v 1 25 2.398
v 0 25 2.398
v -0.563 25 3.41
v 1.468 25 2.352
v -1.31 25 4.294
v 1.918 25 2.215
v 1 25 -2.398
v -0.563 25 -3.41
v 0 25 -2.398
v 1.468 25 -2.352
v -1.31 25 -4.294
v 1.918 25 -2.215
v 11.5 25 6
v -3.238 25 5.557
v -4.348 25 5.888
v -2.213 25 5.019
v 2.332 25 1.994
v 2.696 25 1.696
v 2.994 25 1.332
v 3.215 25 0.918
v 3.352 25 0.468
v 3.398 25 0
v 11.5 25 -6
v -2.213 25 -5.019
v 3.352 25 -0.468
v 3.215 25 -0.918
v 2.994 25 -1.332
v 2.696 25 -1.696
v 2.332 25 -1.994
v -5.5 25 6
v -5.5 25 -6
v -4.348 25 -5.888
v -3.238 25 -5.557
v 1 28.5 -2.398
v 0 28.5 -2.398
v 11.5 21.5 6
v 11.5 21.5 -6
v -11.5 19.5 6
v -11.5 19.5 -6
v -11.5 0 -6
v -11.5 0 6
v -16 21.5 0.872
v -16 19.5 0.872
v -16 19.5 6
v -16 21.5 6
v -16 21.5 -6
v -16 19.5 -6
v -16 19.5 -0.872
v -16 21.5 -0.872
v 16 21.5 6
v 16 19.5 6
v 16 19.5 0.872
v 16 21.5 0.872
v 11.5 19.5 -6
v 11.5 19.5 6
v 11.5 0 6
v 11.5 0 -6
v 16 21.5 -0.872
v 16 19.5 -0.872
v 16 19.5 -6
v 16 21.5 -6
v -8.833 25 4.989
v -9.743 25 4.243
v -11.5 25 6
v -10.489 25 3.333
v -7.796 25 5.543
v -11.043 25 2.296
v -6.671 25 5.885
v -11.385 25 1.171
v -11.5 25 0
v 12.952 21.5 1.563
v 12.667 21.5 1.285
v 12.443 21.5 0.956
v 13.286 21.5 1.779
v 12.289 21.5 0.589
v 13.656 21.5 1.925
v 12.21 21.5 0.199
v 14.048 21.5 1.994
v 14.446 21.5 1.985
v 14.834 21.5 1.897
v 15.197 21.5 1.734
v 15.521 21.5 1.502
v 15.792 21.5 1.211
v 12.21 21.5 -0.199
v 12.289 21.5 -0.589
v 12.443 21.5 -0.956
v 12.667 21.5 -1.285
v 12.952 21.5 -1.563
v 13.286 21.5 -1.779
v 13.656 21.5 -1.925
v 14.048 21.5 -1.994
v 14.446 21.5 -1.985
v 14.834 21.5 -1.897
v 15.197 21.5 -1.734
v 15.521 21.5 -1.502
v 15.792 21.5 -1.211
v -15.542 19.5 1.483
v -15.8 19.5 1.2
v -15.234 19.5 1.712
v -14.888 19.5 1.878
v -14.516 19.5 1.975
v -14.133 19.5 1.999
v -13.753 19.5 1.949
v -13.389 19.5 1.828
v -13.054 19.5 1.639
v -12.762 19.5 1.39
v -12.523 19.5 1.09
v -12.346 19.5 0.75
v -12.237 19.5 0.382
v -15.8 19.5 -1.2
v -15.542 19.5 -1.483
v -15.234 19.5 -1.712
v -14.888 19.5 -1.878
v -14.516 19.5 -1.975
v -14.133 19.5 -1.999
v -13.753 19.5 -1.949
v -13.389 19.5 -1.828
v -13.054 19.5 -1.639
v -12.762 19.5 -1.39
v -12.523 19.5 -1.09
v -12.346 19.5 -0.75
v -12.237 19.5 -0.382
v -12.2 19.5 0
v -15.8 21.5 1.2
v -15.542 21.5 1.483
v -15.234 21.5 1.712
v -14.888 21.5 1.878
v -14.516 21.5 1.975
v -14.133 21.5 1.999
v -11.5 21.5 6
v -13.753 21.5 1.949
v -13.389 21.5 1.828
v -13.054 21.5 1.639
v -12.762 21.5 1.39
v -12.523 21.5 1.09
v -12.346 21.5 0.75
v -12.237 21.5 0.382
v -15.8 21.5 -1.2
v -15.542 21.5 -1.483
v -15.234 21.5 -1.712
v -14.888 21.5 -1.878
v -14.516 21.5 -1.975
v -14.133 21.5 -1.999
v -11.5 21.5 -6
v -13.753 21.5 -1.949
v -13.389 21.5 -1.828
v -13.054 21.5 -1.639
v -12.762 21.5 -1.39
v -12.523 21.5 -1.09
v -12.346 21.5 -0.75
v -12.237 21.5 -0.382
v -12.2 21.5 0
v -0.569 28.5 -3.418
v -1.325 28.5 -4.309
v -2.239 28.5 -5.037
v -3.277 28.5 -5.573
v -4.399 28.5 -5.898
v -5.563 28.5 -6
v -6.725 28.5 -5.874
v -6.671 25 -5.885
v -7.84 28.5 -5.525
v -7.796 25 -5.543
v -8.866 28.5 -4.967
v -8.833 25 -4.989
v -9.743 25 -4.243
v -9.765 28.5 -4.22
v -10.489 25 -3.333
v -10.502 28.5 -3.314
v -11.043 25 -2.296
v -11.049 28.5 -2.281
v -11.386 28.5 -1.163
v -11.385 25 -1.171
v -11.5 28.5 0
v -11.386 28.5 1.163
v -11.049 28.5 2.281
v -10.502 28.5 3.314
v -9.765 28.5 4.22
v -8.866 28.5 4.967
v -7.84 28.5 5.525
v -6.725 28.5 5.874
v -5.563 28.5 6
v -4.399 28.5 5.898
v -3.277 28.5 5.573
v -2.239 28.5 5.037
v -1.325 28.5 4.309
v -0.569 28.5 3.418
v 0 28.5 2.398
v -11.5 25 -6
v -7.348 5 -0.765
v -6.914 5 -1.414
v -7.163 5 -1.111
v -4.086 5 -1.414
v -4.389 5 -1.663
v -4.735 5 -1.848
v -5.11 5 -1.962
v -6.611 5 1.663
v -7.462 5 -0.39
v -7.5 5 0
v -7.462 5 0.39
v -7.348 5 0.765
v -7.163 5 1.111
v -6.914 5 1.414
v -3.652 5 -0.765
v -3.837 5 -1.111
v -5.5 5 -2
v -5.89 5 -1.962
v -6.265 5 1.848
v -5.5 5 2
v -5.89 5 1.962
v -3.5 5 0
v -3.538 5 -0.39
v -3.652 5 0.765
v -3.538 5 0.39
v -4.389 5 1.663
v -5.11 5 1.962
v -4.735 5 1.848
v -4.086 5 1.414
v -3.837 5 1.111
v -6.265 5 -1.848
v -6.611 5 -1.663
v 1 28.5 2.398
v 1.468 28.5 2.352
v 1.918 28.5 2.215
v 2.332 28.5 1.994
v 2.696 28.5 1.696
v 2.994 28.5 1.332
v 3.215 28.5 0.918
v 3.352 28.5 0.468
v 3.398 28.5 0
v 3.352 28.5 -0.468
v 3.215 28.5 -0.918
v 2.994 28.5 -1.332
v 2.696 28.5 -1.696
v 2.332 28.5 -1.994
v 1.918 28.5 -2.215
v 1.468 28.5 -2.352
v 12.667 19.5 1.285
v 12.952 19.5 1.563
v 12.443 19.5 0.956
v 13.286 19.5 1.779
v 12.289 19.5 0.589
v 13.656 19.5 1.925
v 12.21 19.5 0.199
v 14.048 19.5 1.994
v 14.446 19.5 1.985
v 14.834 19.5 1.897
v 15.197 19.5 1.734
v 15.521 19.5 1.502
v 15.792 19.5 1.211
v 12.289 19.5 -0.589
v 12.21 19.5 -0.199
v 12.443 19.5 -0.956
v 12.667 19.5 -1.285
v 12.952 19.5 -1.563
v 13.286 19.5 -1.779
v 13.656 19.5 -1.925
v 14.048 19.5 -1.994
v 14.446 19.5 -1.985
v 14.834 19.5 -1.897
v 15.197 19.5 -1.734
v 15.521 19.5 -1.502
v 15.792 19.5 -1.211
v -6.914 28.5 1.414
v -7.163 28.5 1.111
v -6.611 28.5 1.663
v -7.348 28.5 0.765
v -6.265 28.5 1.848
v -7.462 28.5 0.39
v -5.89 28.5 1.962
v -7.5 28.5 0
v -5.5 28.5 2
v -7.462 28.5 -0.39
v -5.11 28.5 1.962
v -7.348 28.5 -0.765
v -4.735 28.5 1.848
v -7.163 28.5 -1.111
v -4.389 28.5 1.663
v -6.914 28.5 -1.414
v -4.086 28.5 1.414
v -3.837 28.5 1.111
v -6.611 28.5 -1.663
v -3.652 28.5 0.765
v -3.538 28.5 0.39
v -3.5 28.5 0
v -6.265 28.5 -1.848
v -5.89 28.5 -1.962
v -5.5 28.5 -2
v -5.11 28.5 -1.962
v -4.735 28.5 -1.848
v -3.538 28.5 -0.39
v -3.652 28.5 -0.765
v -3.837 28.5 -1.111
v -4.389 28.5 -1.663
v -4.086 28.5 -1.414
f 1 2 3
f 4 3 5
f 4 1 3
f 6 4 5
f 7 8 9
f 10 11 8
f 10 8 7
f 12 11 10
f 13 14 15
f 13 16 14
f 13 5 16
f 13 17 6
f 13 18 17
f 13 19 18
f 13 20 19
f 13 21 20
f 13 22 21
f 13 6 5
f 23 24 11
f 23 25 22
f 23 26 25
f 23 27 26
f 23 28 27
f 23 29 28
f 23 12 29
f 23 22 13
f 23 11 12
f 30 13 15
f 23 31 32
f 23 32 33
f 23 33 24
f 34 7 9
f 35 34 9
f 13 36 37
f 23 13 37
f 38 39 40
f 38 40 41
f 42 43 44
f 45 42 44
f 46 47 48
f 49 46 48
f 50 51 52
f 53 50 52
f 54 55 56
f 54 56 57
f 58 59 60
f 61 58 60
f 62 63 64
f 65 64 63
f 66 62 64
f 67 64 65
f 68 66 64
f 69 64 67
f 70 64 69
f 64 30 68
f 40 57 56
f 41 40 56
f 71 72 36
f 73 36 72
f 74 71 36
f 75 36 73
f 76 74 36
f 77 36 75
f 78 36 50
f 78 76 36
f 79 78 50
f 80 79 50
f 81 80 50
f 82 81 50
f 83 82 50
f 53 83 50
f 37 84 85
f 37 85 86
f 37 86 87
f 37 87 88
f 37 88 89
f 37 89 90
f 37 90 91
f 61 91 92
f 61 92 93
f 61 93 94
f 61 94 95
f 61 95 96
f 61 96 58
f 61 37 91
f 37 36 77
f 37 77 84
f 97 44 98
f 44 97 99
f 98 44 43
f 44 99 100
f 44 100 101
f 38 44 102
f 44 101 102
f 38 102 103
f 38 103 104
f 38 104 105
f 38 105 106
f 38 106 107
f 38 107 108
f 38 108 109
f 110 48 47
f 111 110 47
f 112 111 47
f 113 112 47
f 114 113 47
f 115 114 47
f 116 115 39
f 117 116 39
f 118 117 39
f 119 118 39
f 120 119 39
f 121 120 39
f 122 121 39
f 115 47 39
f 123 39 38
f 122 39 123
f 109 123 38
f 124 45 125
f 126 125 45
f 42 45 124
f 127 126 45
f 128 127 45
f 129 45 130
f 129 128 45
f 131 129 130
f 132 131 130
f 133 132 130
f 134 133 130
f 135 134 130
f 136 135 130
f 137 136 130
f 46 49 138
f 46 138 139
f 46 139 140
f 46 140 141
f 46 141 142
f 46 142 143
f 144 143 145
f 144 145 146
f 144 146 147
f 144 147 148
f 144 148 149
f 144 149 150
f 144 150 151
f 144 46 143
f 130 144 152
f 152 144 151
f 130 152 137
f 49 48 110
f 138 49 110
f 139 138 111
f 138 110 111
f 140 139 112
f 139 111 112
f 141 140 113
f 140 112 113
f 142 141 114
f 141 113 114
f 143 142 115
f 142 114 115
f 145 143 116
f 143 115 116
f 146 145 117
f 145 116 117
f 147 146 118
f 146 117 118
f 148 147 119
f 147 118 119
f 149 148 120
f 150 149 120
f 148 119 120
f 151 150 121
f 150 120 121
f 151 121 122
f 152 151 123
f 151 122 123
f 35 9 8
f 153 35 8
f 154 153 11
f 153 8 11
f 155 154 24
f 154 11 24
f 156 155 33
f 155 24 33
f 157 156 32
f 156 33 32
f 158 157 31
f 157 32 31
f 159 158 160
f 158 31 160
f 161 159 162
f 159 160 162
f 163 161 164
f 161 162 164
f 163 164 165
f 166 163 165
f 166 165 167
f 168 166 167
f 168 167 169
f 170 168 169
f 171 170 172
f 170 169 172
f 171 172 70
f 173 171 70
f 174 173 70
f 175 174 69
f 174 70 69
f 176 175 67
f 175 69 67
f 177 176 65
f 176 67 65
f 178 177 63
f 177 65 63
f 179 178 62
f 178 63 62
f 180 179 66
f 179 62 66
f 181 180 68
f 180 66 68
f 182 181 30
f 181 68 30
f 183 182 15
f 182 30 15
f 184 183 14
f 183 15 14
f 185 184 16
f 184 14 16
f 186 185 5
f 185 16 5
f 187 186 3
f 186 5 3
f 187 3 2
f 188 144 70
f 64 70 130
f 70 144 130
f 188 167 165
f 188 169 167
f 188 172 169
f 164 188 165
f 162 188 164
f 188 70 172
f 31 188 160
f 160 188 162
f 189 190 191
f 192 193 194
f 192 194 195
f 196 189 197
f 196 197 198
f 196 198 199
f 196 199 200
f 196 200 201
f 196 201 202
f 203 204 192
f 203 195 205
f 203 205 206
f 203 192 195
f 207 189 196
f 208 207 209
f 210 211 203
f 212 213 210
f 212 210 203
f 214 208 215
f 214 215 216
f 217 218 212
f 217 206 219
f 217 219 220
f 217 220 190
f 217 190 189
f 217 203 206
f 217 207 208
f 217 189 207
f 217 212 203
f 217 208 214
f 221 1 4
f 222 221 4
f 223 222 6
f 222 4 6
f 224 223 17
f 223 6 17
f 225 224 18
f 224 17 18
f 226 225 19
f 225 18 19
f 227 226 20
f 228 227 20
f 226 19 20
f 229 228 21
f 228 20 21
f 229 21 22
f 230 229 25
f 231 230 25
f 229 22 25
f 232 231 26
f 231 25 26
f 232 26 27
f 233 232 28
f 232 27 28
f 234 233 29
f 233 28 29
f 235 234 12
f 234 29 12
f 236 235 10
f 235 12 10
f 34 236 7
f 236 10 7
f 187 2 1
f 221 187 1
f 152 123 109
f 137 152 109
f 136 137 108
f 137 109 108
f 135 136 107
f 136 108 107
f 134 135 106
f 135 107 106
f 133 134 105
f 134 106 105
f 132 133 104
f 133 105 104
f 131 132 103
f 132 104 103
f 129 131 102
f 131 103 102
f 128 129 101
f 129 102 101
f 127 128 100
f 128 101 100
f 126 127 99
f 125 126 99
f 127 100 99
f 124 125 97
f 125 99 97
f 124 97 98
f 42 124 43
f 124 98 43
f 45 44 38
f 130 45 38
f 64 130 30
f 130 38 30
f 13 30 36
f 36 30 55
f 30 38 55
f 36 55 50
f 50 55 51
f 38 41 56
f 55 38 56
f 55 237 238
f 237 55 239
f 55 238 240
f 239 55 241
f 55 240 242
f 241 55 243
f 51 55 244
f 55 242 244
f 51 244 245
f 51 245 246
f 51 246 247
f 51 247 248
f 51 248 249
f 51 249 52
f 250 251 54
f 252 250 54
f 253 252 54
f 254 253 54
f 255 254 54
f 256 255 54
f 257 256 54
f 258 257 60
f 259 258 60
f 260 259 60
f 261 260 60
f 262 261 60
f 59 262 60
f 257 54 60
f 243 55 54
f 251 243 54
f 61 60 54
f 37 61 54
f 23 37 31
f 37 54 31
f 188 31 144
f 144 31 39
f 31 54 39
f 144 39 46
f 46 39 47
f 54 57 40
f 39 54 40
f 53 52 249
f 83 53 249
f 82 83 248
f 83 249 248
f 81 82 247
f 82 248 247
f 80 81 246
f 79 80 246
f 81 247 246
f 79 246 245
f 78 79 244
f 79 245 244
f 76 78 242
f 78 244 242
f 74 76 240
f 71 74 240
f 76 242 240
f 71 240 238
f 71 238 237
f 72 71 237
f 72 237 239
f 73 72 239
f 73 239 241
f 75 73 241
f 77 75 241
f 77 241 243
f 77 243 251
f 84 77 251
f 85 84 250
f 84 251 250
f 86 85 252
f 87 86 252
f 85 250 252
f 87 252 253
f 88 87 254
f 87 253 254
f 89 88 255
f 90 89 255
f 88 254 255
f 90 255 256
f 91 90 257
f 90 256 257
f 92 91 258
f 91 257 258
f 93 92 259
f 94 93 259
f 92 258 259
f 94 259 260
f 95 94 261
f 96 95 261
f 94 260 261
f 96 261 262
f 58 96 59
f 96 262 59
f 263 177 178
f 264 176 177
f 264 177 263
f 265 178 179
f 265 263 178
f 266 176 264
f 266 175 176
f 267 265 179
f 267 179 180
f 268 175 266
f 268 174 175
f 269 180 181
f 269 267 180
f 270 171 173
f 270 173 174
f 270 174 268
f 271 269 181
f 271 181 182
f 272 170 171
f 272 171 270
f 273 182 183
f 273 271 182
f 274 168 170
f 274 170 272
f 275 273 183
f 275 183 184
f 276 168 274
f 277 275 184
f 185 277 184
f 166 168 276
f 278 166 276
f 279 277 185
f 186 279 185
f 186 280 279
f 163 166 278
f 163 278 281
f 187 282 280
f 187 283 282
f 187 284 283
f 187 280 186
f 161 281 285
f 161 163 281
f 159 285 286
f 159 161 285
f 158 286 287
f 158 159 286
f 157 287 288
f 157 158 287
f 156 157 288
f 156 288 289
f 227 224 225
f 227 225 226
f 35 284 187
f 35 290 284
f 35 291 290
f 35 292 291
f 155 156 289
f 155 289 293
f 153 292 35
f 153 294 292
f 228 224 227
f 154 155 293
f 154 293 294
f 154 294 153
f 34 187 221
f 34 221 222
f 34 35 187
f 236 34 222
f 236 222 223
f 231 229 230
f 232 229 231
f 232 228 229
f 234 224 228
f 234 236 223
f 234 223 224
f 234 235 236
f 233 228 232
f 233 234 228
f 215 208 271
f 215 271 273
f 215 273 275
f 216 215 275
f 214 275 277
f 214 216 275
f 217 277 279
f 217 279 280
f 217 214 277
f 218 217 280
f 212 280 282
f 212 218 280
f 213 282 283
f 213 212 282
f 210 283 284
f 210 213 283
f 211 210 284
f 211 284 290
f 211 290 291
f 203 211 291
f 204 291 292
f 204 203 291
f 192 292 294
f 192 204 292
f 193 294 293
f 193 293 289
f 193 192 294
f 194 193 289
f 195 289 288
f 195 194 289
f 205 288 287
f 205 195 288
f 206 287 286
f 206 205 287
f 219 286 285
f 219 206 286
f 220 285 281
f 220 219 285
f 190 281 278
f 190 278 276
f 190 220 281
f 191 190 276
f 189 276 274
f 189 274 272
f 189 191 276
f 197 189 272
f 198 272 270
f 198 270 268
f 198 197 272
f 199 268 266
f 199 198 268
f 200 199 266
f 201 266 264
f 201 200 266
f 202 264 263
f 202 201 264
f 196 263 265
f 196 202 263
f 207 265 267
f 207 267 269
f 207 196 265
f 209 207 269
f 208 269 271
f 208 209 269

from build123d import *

# Parameters (mm, degrees)
SKETCH1_R           = 6
SKETCH1_R_2         = 2
BOSS_EXTRUDE1_DEPTH = 25
BOSS_EXTRUDE2_START = 19.5
BOSS_EXTRUDE2_DEPTH = 2
BOSS_EXTRUDE3_START = 25
SKETCH1_6_R         = 6
SKETCH1_6_R_2       = 2
BOSS_EXTRUDE3_DEPTH = 3.5
SKETCH1_7_R         = 2
BOSS_EXTRUDE4_DEPTH = 5


with BuildPart() as part:
    # Sketch1 → Boss-Extrude1 (new body)
    with BuildSketch(Plane(origin=(0, 0, 0), x_dir=(1, 0, 0), z_dir=(0, 1, 0))):
        with Locations((-5.5, 0)):
            Circle(SKETCH1_R)
        with Locations(Location((-5.5, 0, 0), (0, 0, 270))):
            Circle(SKETCH1_R_2, mode=Mode.SUBTRACT)
        with BuildLine():
            ThreePointArc((-5.499999996, 6), (-2.212713471, 5.019337334), (0, 2.397915762))
            Line((0, 2.397915762), (1, 2.397915762))
            ThreePointArc((1, 2.397915762), (3.397915762, 0), (1, -2.397915762))
            Line((1, -2.397915762), (0, -2.397915762))
            ThreePointArc((0, -2.397915762), (-2.212713472, -5.019337335), (-5.5, -6))
            Line((-5.5, -6), (11.5, -6))
            Line((11.5, -6), (11.5, 6))
            Line((11.5, 6), (-5.499999996, 6))
        make_face()
        with BuildLine():
            ThreePointArc((-5.5, -6), (-9.742640687, -4.242640687), (-11.5, 0))
            Line((-11.5, 0), (-11.5, -6))
            Line((-11.5, -6), (-5.5, -6))
        make_face()
        with BuildLine():
            Line((1, 2.397915762), (0, 2.397915762))
            ThreePointArc((0, 2.397915762), (0.373670062, 1.224744871), (0.5, 0))
            ThreePointArc((0.5, 0), (0.373670062, -1.224744871), (0, -2.397915762))
            Line((0, -2.397915762), (1, -2.397915762))
            ThreePointArc((1, -2.397915762), (3.397915762, 0), (1, 2.397915762))
        make_face()
        with BuildLine():
            ThreePointArc((-11.5, 0), (-9.742640686, 4.242640689), (-5.499999996, 6))
            Line((-5.499999996, 6), (-11.5, 6))
            Line((-11.5, 6), (-11.5, 0))
        make_face()
    extrude(amount=BOSS_EXTRUDE1_DEPTH)

    # Sketch1<4> → Boss-Extrude2 (add)
    with BuildSketch(Plane(origin=(0, 0, 0), x_dir=(1, 0, 0), z_dir=(0, 1, 0)).offset(BOSS_EXTRUDE2_START)):
        with BuildLine():
            Line((16, 6), (11.5, 6))
            Line((11.5, 6), (11.5, -6))
            Line((11.5, -6), (16, -6))
            Line((16, -6), (16, -0.871779789))
            ThreePointArc((16, -0.871779789), (12.2, 0), (16, 0.871779789))
            Line((16, 0.871779789), (16, 6))
        make_face()
        with BuildLine():
            Line((-11.5, 0), (-11.5, 6))
            Line((-11.5, 6), (-16, 6))
            Line((-16, 6), (-16, 0.871779789))
            ThreePointArc((-16, 0.871779789), (-13.752786405, 1.949358869), (-12.2, 0))
            ThreePointArc((-12.2, 0), (-13.752786405, -1.949358869), (-16, -0.871779789))
            Line((-16, -0.871779789), (-16, -6))
            Line((-16, -6), (-11.5, -6))
            Line((-11.5, -6), (-11.5, 0))
        make_face()
    extrude(amount=BOSS_EXTRUDE2_DEPTH)

    # Sketch1<6> → Boss-Extrude3 (add)
    with BuildSketch(Plane(origin=(0, 0, 0), x_dir=(1, 0, 0), z_dir=(0, 1, 0)).offset(BOSS_EXTRUDE3_START)):
        with Locations((-5.5, 0)):
            Circle(SKETCH1_6_R)
        with Locations(Location((-5.5, 0, 0), (0, 0, 270))):
            Circle(SKETCH1_6_R_2, mode=Mode.SUBTRACT)
        with BuildLine():
            Line((1, 2.397915762), (0, 2.397915762))
            ThreePointArc((0, 2.397915762), (0.373670062, 1.224744871), (0.5, 0))
            ThreePointArc((0.5, 0), (0.373670062, -1.224744871), (0, -2.397915762))
            Line((0, -2.397915762), (1, -2.397915762))
            ThreePointArc((1, -2.397915762), (3.397915762, 0), (1, 2.397915762))
        make_face()
    extrude(amount=BOSS_EXTRUDE3_DEPTH)

    # Sketch1<7> → Boss-Extrude4 (add)
    with BuildSketch(Plane(origin=(0, 0, 0), x_dir=(1, 0, 0), z_dir=(0, 1, 0))):
        with Locations(Location((-5.5, 0, 0), (0, 0, 270))):
            Circle(SKETCH1_7_R)
    extrude(amount=BOSS_EXTRUDE4_DEPTH)


solid = part.part
